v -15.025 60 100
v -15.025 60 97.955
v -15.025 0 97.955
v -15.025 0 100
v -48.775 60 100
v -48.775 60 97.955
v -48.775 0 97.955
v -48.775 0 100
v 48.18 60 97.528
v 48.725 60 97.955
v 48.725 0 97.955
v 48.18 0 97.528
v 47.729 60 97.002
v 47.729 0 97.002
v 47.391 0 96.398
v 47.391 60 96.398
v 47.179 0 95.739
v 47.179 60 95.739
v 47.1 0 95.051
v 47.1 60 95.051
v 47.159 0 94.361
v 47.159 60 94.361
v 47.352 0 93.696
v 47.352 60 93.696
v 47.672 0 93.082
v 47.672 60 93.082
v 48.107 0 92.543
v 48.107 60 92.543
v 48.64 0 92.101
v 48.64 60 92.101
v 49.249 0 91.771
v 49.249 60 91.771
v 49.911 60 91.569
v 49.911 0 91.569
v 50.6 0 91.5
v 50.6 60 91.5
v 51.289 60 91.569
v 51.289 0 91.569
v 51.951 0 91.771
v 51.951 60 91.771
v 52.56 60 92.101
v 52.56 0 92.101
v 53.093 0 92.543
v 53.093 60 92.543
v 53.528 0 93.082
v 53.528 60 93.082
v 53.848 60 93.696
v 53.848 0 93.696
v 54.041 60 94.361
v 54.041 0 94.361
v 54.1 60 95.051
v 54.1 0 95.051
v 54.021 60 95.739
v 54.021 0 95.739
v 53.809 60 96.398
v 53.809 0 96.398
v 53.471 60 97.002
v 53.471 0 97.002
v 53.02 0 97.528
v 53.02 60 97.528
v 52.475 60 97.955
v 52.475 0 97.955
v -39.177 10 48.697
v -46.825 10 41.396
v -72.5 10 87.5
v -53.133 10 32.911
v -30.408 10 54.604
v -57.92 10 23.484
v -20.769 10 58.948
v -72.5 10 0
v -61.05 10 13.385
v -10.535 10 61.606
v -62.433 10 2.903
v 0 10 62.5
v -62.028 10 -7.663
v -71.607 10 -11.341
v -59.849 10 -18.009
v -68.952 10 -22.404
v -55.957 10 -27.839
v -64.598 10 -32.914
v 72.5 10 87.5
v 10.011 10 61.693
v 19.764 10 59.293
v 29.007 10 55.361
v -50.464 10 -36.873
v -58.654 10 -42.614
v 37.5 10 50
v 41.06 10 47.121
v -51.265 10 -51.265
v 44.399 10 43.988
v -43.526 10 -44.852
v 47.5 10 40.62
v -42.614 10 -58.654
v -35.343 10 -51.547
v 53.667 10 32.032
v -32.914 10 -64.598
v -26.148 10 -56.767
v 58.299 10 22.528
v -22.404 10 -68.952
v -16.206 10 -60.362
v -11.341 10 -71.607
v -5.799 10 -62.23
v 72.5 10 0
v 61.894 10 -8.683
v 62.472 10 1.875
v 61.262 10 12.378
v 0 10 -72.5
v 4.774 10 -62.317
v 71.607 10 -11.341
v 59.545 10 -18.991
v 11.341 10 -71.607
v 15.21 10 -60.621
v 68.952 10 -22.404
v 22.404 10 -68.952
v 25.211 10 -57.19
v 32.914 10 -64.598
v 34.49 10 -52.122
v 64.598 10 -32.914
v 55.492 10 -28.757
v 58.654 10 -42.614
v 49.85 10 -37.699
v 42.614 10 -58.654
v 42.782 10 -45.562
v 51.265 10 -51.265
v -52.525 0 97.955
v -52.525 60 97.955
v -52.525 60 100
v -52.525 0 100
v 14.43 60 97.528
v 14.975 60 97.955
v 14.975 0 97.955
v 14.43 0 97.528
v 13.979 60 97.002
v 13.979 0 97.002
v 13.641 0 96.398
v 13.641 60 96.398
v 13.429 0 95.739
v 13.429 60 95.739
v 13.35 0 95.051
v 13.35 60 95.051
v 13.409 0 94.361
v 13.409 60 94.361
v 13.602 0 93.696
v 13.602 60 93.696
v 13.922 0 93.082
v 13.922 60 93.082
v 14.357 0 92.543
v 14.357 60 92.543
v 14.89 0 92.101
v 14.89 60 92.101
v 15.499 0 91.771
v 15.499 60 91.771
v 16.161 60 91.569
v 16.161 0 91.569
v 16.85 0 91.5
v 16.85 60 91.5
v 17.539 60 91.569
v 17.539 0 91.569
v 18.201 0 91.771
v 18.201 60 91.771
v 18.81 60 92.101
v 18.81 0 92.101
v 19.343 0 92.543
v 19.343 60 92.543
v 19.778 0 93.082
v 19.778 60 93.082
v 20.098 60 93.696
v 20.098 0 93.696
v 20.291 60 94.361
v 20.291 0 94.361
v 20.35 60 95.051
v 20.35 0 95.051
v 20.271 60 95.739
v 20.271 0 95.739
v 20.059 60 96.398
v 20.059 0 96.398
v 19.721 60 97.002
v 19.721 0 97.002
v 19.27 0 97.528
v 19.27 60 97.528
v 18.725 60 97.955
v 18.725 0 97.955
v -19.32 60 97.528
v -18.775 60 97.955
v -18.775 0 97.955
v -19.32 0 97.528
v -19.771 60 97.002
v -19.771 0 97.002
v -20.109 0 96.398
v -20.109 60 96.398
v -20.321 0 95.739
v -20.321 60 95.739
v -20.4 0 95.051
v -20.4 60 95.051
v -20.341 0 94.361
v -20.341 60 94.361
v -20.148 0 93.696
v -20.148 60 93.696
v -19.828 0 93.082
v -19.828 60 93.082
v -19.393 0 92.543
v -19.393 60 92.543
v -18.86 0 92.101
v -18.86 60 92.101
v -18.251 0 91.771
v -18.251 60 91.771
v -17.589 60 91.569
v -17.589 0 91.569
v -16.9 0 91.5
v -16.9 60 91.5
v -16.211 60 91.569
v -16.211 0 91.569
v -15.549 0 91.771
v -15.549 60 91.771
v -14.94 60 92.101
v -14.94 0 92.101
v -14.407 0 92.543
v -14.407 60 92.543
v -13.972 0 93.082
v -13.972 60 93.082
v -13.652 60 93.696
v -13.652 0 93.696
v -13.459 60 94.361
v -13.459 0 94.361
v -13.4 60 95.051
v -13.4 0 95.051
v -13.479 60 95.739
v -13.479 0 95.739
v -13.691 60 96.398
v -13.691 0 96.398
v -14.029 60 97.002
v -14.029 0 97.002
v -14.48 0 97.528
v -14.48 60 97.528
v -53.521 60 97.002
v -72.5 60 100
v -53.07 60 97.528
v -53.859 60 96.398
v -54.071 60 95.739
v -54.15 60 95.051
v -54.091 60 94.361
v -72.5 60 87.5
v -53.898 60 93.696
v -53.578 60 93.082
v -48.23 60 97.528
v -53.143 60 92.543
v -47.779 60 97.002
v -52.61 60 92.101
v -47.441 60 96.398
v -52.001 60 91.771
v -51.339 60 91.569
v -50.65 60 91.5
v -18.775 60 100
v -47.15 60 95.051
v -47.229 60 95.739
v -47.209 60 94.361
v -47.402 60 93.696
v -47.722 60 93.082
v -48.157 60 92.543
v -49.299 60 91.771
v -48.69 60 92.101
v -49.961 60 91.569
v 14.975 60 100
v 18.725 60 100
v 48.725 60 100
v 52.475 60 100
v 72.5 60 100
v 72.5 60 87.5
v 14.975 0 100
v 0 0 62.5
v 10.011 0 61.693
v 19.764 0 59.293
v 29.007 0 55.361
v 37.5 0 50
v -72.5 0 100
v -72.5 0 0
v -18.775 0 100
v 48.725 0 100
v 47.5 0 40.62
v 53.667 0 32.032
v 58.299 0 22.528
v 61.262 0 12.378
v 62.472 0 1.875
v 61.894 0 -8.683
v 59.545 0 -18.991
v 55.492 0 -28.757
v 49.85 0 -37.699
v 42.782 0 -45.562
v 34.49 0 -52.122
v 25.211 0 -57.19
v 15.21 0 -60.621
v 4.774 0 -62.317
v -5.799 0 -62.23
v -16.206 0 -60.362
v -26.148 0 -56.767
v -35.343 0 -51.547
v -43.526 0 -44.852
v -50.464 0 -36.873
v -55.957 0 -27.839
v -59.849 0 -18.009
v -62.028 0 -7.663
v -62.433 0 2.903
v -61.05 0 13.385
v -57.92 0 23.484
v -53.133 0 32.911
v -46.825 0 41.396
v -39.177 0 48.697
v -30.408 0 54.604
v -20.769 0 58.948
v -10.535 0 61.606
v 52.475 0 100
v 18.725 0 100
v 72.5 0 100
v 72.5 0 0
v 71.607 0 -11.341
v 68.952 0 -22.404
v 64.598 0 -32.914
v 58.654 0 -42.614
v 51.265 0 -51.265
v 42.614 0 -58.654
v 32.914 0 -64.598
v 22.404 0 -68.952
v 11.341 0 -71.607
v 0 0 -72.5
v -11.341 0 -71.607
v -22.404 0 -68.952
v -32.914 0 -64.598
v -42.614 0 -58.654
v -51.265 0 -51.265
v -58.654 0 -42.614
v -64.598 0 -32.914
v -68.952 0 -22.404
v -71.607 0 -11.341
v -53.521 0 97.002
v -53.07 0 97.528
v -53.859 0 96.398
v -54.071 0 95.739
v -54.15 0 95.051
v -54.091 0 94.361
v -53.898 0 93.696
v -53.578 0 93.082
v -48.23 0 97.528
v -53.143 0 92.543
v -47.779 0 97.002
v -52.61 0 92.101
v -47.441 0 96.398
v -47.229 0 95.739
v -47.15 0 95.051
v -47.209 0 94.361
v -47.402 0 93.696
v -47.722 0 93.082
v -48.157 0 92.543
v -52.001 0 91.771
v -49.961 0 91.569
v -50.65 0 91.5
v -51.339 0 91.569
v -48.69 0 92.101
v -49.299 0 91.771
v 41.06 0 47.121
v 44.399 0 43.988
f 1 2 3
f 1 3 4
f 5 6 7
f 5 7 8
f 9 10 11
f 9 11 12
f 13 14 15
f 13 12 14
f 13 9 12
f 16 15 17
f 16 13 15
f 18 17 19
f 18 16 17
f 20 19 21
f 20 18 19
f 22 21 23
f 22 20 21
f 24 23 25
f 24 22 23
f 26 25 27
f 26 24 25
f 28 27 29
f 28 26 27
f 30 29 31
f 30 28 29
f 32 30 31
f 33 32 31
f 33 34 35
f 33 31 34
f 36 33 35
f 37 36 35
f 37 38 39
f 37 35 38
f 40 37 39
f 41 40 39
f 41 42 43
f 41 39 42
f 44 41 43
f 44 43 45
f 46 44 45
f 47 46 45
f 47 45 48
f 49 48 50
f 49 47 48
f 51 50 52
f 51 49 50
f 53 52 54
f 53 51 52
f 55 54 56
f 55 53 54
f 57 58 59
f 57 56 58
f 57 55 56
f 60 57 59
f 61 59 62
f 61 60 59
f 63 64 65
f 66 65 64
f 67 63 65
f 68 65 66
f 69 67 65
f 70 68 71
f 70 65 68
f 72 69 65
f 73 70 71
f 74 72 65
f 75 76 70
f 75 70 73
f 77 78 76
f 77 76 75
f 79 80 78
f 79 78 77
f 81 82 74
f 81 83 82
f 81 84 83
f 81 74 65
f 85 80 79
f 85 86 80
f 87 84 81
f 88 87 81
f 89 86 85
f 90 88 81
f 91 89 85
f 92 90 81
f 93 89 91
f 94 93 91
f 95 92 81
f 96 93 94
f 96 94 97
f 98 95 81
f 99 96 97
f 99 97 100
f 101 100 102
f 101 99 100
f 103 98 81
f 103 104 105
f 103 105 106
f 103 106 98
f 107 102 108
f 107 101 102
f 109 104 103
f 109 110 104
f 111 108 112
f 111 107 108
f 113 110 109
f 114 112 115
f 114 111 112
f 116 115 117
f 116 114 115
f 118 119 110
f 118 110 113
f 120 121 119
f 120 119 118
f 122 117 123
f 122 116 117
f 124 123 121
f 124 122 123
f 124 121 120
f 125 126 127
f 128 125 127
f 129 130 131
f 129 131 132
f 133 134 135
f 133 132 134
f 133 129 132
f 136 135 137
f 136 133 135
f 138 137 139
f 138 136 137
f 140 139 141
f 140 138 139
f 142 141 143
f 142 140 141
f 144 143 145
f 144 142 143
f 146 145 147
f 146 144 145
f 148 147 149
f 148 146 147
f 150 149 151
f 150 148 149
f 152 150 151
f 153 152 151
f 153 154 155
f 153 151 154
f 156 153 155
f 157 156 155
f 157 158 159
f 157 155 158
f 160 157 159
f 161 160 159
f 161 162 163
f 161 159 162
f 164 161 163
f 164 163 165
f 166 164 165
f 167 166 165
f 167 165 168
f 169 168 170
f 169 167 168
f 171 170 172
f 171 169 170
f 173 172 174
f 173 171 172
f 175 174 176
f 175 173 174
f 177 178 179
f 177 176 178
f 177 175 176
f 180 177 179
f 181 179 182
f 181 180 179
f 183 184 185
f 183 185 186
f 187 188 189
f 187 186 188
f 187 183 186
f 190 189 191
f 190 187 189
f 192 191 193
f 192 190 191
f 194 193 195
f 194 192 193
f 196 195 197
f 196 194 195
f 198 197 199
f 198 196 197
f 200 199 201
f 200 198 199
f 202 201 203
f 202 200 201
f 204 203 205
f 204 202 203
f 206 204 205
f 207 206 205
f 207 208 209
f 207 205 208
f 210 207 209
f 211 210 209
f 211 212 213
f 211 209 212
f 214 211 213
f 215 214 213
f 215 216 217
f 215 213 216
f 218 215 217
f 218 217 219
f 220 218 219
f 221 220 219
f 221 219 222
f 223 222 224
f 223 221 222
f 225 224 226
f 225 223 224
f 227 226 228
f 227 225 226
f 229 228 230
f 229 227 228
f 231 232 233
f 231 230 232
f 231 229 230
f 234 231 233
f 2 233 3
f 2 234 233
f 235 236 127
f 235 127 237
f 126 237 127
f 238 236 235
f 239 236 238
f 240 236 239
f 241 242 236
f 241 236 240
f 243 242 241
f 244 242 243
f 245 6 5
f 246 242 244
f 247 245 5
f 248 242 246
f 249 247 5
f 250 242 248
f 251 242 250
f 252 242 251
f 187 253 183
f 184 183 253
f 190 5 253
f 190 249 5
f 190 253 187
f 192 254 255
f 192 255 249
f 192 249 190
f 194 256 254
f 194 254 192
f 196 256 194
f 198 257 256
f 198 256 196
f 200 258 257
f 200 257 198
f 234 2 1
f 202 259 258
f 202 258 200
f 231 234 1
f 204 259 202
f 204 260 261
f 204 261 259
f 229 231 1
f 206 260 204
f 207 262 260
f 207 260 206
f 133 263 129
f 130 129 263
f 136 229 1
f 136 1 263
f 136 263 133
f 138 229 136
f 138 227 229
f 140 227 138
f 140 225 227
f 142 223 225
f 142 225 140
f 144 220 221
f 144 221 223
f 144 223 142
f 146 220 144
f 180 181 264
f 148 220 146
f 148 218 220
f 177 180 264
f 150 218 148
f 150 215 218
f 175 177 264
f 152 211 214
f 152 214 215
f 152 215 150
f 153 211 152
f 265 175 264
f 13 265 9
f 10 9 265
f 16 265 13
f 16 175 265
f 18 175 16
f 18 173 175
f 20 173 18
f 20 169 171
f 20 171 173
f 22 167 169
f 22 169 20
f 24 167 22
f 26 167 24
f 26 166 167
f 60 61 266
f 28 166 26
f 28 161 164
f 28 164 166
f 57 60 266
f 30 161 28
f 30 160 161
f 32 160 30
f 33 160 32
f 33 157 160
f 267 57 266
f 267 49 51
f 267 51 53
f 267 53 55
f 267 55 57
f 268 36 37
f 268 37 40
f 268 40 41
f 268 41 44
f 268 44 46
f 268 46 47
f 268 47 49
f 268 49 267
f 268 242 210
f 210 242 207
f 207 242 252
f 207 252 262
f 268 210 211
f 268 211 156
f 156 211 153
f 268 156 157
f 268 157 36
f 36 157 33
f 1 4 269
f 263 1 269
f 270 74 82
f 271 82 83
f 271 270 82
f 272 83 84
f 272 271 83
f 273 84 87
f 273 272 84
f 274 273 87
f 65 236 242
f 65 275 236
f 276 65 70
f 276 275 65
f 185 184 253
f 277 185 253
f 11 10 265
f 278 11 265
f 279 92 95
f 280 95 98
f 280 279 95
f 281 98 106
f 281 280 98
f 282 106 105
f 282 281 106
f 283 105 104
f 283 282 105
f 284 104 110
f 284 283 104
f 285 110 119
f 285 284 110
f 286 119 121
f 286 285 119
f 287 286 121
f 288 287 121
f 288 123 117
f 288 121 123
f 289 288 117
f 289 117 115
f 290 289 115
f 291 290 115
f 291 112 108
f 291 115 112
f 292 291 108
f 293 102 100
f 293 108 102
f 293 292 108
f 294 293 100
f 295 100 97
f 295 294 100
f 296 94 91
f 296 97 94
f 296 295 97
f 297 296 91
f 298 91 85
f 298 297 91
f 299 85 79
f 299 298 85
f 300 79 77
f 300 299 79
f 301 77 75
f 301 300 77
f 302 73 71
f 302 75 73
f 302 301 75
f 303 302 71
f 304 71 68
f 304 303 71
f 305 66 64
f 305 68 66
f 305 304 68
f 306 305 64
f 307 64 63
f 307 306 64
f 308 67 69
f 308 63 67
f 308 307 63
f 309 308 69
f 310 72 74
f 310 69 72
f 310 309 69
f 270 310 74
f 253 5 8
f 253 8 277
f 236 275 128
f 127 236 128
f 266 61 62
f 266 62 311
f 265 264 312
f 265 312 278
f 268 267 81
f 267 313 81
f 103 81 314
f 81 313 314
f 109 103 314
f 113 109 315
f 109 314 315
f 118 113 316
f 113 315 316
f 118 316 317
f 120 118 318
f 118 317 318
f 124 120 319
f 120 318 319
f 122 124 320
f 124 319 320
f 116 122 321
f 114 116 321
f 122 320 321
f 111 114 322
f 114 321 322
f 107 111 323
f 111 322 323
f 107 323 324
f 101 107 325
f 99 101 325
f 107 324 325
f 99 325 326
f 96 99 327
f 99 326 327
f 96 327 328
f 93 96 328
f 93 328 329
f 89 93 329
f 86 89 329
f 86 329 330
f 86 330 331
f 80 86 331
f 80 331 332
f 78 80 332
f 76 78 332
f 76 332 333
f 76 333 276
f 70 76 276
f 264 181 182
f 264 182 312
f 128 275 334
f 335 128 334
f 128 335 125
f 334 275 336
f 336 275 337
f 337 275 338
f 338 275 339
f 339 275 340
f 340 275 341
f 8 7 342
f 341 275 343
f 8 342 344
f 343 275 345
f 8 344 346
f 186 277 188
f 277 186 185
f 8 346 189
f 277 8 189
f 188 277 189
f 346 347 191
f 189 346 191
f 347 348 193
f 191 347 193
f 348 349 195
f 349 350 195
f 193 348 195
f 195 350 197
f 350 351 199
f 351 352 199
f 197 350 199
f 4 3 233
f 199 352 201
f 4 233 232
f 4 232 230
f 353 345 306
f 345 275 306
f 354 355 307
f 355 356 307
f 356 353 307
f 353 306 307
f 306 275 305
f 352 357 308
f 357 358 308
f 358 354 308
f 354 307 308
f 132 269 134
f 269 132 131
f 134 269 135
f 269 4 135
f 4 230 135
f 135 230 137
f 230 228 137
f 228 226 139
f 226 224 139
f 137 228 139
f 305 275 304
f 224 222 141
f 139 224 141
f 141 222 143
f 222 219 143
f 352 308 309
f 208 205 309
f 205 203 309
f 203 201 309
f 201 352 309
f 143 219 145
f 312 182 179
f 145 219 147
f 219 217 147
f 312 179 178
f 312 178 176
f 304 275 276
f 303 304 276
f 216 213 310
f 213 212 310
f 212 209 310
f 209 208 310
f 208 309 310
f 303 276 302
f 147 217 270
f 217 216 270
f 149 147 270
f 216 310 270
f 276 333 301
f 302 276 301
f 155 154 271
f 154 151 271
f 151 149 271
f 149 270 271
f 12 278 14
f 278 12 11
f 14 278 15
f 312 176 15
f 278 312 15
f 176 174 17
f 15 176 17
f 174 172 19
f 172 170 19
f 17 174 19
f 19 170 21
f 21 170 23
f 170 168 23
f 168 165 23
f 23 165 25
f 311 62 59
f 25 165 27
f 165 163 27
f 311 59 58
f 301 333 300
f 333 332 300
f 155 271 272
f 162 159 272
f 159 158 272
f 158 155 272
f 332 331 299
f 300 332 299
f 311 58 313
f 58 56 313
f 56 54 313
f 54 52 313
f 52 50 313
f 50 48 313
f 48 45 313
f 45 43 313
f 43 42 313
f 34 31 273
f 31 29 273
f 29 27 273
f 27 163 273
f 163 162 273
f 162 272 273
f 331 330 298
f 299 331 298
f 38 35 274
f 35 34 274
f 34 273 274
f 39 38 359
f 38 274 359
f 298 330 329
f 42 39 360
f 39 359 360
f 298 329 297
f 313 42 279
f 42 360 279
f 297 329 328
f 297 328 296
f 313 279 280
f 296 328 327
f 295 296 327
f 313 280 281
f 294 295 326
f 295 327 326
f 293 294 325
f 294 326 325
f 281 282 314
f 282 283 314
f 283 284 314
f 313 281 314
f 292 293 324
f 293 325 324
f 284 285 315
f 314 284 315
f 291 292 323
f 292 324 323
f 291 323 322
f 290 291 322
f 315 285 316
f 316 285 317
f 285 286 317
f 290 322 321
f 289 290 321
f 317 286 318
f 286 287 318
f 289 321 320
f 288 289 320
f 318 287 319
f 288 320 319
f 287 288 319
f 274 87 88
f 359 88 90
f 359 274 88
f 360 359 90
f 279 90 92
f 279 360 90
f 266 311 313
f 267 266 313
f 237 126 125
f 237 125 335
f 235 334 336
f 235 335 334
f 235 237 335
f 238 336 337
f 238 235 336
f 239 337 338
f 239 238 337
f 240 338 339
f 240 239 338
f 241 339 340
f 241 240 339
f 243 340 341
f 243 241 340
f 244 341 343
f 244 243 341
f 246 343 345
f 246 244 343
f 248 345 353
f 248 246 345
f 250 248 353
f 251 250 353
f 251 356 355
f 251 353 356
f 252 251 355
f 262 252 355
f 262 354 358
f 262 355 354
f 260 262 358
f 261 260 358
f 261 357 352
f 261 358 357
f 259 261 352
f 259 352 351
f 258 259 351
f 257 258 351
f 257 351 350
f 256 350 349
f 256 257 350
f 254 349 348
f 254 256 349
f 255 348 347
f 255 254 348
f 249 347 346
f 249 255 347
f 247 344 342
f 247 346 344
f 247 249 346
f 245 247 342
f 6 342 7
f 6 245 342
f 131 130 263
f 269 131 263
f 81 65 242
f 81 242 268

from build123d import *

# Parameters (mm, degrees)
SKETCH1_R               = 72.5
SKETCH1_R_2             = 62.5
BOSS_EXTRUDE1_DEPTH     = 10
SKETCH2_W               = 25
SKETCH2_H               = 10
BOSS_EXTRUDE2_DEPTH     = 100
SKETCH3_W               = 145
SKETCH3_H               = 50
BOSS_EXTRUDE3_DEPTH     = 10
CUT_EXTRUDE1_START      = -10
SKETCH4_R               = 62.5
CUT_EXTRUDE1_DEPTH      = 10
SKETCH5_W               = 145
SKETCH5_H               = 12.5
BOSS_EXTRUDE4_DEPTH     = 50
CUT_EXTRUDE2_DEPTH      = 138.318061449
CUT_EXTRUDE2_DEPTH_BACK = 138.318061449
SKETCH6_R               = 3.5
CUT_EXTRUDE3_DEPTH      = 138.318061449
CUT_EXTRUDE3_DEPTH_BACK = 138.318061449
SKETCH7_W               = 3.75
SKETCH7_H               = 5


with BuildPart() as part:
    # Sketch1 → Boss-Extrude1 (new body)
    with BuildSketch(Plane(origin=(0, 0, 0), x_dir=(1, 0, 0), z_dir=(0, 1, 0))):
        with Locations(Location((0, 0, 0), (0, 0, 270))):
            Circle(SKETCH1_R)
        with Locations(Location((0, 0, 0), (0, 0, 270))):
            Circle(SKETCH1_R_2, mode=Mode.SUBTRACT)
    extrude(amount=BOSS_EXTRUDE1_DEPTH)

    # Sketch2 → Boss-Extrude2 (add)
    with BuildSketch(Plane.XY):
        with Locations((-60, 5)):
            Rectangle(SKETCH2_W, SKETCH2_H)
        with Locations((60, 5)):
            Rectangle(SKETCH2_W, SKETCH2_H)
    extrude(amount=BOSS_EXTRUDE2_DEPTH)

    # Sketch3 → Boss-Extrude3 (add)
    with BuildSketch(Plane(origin=(0, 10, 0), x_dir=(1, 0, 0), z_dir=(0, 1, 0))):
        with Locations((0, -75)):
            Rectangle(SKETCH3_W, SKETCH3_H)
    extrude(amount=-BOSS_EXTRUDE3_DEPTH)

    # Sketch4 → Cut-Extrude1 (cut)
    with BuildSketch(Plane(origin=(0, 10, 0), x_dir=(1, 0, 0), z_dir=(0, 1, 0)).offset(CUT_EXTRUDE1_START)):
        with Locations(Location((0, 0, 0), (0, 0, 270))):
            Circle(SKETCH4_R)
    extrude(amount=CUT_EXTRUDE1_DEPTH, mode=Mode.SUBTRACT)

    # Sketch5 → Boss-Extrude4 (add)
    with BuildSketch(Plane(origin=(0, 10, 0), x_dir=(1, 0, 0), z_dir=(0, 1, 0))):
        with Locations((0, -93.75)):
            Rectangle(SKETCH5_W, SKETCH5_H)
    extrude(amount=BOSS_EXTRUDE4_DEPTH)

    # Sketch6 → Cut-Extrude2 (cut, two sides: drawn at the far end of the back side and taken through both)
    with BuildSketch(Plane.XZ.offset(-CUT_EXTRUDE2_DEPTH_BACK)):
        with Locations(Location((-50.65, 95, 0), (0, 0, 270))):
            Circle(SKETCH6_R)
        with Locations(Location((-16.9, 95, 0), (0, 0, 270))):
            Circle(SKETCH6_R)
        with Locations(Location((16.85, 95, 0), (0, 0, 270))):
            Circle(SKETCH6_R)
        with Locations(Location((50.6, 95, 0), (0, 0, 270))):
            Circle(SKETCH6_R)
    extrude(amount=CUT_EXTRUDE2_DEPTH + CUT_EXTRUDE2_DEPTH_BACK, mode=Mode.SUBTRACT)

    # Sketch7 → Cut-Extrude3 (cut, two sides: drawn at the far end of the back side and taken through both)
    with BuildSketch(Plane.XZ.offset(-CUT_EXTRUDE3_DEPTH_BACK)):
        with Locations((-16.9, 100)):
            Rectangle(SKETCH7_W, SKETCH7_H)
        with Locations((-50.65, 100)):
            Rectangle(SKETCH7_W, SKETCH7_H)
        with Locations((16.85, 100)):
            Rectangle(SKETCH7_W, SKETCH7_H)
        with Locations((50.6, 100)):
            Rectangle(SKETCH7_W, SKETCH7_H)
    extrude(amount=CUT_EXTRUDE3_DEPTH + CUT_EXTRUDE3_DEPTH_BACK, mode=Mode.SUBTRACT)


solid = part.part
